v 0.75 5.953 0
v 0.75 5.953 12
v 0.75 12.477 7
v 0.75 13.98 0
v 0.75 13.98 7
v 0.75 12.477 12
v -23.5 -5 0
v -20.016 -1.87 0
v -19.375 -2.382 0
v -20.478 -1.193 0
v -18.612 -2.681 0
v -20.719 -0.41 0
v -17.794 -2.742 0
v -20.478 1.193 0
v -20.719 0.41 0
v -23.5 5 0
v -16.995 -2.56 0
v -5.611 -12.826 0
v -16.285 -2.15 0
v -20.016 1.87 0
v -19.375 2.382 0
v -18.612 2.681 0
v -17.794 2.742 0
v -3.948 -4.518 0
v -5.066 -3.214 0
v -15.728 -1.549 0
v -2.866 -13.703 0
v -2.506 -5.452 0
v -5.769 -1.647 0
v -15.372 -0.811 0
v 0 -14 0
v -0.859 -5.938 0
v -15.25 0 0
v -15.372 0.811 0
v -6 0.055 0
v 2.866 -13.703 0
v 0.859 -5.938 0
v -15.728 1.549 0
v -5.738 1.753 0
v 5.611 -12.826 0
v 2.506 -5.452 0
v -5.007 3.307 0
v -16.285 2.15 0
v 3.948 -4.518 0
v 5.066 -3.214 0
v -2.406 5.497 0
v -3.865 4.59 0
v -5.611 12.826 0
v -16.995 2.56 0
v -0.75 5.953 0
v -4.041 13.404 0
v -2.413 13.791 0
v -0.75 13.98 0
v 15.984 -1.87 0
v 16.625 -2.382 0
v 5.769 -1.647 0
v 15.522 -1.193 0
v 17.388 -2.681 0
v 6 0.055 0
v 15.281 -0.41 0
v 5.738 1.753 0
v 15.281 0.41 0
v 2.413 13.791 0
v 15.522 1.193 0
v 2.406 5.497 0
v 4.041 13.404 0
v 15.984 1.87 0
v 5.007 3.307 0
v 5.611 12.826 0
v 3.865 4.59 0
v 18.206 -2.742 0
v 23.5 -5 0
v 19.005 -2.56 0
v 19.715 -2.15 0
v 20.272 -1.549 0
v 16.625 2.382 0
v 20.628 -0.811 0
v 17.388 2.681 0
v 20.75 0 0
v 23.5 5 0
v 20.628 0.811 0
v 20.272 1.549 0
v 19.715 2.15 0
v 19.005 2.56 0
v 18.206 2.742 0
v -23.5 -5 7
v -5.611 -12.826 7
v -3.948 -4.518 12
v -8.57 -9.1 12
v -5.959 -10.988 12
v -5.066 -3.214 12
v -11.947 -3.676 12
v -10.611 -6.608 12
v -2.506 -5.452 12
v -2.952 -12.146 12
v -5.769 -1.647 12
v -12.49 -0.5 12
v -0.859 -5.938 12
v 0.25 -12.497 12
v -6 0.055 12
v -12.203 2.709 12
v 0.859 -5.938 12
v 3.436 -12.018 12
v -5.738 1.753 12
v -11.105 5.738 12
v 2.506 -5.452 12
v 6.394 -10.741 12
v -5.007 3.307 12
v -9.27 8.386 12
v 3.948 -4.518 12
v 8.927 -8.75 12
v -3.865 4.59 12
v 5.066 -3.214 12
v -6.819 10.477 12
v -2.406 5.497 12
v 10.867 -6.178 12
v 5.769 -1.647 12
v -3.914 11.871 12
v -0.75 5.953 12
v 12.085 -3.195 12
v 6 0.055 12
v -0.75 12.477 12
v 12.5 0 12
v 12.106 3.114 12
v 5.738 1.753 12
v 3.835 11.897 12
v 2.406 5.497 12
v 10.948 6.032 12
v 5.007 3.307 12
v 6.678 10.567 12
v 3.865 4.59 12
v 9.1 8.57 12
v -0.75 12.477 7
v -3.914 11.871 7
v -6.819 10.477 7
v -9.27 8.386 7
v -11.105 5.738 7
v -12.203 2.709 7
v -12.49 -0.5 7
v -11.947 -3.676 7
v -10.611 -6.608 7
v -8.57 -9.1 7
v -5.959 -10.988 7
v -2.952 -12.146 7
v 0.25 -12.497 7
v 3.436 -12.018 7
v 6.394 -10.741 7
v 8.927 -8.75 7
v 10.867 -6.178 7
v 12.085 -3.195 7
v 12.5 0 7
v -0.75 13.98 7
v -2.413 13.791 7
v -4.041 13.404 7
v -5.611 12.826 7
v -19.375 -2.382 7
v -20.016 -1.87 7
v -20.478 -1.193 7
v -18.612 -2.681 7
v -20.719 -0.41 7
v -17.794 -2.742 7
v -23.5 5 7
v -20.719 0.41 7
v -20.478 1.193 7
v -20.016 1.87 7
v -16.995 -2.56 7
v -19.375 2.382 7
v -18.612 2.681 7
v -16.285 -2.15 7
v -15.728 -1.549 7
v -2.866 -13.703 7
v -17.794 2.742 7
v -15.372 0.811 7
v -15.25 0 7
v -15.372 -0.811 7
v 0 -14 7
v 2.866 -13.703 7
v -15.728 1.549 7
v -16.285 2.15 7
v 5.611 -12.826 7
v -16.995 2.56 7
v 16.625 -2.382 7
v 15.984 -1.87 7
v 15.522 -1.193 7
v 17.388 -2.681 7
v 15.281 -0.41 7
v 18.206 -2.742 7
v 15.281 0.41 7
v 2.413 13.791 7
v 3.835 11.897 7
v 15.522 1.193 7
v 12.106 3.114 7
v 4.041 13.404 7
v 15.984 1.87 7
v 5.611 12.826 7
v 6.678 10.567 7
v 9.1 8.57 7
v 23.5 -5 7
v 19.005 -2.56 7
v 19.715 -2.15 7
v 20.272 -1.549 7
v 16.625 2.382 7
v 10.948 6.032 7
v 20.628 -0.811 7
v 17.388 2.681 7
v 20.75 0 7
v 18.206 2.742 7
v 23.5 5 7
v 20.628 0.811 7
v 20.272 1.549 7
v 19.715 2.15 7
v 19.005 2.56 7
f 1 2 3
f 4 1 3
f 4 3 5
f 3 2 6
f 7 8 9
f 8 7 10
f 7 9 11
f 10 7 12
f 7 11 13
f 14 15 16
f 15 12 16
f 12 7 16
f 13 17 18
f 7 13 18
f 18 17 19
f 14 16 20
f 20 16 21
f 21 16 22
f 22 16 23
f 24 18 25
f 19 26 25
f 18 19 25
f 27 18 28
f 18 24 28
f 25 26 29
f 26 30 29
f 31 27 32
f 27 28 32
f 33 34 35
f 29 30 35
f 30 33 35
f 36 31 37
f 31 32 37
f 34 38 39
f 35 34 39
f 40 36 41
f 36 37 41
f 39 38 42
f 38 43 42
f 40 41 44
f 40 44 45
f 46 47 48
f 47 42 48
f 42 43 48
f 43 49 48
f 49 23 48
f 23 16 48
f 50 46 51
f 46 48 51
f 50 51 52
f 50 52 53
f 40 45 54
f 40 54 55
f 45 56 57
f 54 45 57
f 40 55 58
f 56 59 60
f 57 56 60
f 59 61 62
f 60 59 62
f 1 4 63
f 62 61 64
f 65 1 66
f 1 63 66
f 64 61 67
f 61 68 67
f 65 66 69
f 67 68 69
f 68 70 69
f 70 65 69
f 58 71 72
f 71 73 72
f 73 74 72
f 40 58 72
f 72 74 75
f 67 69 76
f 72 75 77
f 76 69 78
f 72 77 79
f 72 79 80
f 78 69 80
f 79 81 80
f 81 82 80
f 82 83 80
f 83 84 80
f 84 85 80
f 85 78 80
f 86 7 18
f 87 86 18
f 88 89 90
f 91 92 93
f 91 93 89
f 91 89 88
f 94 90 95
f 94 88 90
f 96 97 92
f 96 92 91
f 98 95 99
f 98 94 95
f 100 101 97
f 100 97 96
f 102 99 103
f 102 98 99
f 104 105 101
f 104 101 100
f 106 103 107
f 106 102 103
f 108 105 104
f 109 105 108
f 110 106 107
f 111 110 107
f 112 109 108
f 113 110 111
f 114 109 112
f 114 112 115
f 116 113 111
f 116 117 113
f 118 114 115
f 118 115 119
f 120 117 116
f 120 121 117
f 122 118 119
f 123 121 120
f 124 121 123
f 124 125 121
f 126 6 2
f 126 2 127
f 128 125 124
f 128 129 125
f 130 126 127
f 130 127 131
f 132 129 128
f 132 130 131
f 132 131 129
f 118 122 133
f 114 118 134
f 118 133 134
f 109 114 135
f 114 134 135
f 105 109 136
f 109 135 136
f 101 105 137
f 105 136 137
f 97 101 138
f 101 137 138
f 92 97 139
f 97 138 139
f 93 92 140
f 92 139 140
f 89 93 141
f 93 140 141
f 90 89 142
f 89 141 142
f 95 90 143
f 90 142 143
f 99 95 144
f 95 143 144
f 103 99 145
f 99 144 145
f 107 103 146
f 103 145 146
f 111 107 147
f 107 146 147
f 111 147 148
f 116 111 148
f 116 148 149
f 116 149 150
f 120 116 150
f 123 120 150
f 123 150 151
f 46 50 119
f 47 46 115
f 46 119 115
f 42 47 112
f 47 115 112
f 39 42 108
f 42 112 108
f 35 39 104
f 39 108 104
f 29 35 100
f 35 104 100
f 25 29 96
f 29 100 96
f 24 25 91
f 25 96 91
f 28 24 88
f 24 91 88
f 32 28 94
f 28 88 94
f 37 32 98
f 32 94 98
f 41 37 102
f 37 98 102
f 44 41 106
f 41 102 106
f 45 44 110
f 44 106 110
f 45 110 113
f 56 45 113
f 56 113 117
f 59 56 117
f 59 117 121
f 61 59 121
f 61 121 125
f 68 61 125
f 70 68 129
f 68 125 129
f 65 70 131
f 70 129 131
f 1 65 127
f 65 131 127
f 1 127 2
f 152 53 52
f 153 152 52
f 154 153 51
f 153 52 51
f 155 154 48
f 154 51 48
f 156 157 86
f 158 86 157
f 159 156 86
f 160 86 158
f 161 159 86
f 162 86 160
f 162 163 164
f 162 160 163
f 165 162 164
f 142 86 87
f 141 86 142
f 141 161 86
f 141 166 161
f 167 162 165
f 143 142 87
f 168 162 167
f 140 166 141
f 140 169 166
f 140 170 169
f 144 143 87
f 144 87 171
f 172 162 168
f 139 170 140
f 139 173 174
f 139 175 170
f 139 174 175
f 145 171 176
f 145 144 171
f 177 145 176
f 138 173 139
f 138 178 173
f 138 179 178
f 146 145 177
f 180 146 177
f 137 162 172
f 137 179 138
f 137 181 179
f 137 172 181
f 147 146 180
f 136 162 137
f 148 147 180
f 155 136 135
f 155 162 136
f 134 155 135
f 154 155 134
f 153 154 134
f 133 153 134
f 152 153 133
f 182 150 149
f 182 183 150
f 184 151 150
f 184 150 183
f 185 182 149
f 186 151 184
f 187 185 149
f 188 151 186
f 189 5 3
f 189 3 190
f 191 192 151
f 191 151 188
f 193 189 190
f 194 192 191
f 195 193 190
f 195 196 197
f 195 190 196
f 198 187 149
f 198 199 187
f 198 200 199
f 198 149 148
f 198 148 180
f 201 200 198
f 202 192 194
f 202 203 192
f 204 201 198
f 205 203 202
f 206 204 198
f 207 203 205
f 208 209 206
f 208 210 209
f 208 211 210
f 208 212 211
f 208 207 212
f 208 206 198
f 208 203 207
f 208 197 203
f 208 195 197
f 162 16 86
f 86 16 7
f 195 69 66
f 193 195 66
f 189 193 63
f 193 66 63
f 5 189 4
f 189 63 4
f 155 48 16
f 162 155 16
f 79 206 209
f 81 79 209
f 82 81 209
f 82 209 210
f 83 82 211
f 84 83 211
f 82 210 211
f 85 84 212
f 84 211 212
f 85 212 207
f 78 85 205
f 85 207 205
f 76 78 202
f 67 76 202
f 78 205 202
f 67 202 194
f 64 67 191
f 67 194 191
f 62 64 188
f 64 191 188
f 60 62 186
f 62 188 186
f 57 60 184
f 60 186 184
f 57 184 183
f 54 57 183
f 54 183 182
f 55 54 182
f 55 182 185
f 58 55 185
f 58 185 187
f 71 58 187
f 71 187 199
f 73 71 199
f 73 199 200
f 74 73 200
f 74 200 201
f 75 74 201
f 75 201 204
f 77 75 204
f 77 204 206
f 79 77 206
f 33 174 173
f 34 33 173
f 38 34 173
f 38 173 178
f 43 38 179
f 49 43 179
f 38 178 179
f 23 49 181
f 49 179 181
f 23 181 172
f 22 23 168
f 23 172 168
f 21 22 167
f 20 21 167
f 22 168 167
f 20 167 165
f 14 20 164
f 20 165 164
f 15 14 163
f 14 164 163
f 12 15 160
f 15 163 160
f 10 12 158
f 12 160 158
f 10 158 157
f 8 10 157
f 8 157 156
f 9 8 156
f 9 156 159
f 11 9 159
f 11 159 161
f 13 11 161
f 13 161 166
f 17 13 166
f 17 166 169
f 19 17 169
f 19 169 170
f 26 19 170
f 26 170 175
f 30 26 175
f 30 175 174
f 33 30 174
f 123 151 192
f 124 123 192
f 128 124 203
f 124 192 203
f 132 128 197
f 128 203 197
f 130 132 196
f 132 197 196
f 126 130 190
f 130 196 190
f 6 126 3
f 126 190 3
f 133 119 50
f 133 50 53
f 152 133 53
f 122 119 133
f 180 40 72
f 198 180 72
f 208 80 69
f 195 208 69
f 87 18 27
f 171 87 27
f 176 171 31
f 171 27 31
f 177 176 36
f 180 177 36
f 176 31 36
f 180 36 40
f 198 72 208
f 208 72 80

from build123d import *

# Parameters (mm, degrees)
BOSS_EXTRUDE1_DEPTH = 7
SKETCH2_R           = 12.5
BOSS_EXTRUDE2_DEPTH = 5
SKETCH3_R           = 6
CUT_EXTRUDE1_DEPTH  = 13
SKETCH4_R           = 2.75
CUT_EXTRUDE2_DEPTH  = 8
SKETCH5_W           = 1.5
SKETCH5_H           = 20
CUT_EXTRUDE3_DEPTH  = 13


with BuildPart() as part:
    # Sketch1 → Boss-Extrude1 (new body)
    with BuildSketch(Plane.XY):
        with BuildLine():
            Line((-5.611444446, 12.826211102), (-23.5, 5))
            Line((-23.5, 5), (-23.5, -5))
            Line((-23.5, -5), (-5.611444446, -12.826211102))
            ThreePointArc((-5.611444446, -12.826211102), (0, -14), (5.611444446, -12.826211102))
            Line((5.611444446, -12.826211102), (23.5, -5))
            Line((23.5, -5), (23.5, 5))
            Line((23.5, 5), (5.611444446, 12.826211102))
            ThreePointArc((5.611444446, 12.826211102), (0, 14), (-5.611444446, 12.826211102))
        make_face()
    extrude(amount=BOSS_EXTRUDE1_DEPTH)

    # Sketch2 → Boss-Extrude2 (add)
    with BuildSketch(Plane.XY.offset(7)):
        Circle(SKETCH2_R)
    extrude(amount=BOSS_EXTRUDE2_DEPTH)

    # Sketch3 → Cut-Extrude1 (cut, through all)
    with BuildSketch(Plane.XY.offset(12)):
        Circle(SKETCH3_R)
    extrude(amount=-CUT_EXTRUDE1_DEPTH, mode=Mode.SUBTRACT)

    # Sketch4 → Cut-Extrude2 (cut, through all)
    with BuildSketch(Plane.XY.offset(7)):
        with Locations((-18, 0)):
            Circle(SKETCH4_R)
        with Locations((18, 0)):
            Circle(SKETCH4_R)
    extrude(amount=-CUT_EXTRUDE2_DEPTH, mode=Mode.SUBTRACT)

    # Sketch5 → Cut-Extrude3 (cut, through all)
    with BuildSketch(Plane.XY.offset(12)):
        with Locations((0, 15)):
            Rectangle(SKETCH5_W, SKETCH5_H)
    extrude(amount=-CUT_EXTRUDE3_DEPTH, mode=Mode.SUBTRACT)


solid = part.part
